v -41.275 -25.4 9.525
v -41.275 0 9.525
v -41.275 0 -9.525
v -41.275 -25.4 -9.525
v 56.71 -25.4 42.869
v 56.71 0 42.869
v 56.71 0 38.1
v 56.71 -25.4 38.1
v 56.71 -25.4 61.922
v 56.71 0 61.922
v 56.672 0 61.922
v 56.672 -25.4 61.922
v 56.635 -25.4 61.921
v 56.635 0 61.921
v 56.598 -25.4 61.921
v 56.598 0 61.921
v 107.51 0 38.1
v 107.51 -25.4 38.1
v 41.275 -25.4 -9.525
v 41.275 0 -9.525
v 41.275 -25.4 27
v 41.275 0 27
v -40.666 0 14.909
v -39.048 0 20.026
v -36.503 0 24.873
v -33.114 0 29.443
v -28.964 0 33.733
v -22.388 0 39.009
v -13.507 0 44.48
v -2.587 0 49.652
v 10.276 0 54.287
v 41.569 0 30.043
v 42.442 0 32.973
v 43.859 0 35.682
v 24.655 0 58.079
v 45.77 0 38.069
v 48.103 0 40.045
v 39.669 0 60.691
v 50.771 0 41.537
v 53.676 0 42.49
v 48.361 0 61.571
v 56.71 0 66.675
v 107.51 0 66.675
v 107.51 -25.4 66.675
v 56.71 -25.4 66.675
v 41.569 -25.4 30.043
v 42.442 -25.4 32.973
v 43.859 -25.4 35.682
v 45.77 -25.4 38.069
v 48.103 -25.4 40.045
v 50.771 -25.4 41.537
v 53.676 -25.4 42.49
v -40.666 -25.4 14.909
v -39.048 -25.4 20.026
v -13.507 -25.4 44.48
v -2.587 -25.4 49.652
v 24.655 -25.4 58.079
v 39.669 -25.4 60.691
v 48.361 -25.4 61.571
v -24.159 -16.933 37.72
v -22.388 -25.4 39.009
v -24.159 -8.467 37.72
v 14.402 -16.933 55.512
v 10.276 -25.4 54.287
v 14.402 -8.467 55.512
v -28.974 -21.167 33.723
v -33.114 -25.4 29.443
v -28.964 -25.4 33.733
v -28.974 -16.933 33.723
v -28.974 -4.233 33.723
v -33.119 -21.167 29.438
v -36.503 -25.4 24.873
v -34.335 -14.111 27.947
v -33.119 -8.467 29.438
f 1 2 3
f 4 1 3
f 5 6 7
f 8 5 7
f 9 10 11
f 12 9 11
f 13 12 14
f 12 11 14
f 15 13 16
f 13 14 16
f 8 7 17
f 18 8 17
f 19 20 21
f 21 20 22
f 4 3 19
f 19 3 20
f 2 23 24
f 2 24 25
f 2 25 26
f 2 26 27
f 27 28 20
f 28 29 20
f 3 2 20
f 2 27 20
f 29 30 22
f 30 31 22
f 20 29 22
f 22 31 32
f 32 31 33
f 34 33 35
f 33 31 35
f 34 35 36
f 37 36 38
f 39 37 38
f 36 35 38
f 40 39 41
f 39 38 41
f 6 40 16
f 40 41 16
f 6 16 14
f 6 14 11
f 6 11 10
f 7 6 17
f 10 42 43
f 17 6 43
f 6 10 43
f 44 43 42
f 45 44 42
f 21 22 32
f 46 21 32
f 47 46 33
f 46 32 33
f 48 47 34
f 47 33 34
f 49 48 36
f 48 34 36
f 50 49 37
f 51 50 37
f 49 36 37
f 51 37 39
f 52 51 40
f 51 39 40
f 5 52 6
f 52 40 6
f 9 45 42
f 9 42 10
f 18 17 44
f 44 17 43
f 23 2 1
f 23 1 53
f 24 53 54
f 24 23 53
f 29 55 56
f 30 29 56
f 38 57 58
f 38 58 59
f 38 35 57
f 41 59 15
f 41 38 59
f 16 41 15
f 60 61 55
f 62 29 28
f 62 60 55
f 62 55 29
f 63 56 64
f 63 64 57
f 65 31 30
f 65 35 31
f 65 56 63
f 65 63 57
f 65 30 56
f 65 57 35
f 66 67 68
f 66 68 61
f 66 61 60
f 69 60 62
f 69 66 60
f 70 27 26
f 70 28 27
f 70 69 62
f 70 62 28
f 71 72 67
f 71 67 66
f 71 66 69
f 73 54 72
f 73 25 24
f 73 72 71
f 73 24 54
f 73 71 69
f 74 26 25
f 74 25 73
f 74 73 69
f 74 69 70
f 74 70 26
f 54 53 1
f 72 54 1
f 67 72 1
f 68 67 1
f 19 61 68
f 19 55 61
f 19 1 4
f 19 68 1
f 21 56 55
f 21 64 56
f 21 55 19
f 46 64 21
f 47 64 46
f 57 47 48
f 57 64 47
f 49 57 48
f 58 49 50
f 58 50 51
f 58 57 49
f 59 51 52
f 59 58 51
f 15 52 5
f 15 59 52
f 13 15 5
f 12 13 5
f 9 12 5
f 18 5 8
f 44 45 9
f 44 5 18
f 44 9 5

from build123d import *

# Parameters (mm, degrees)
F0_W     = 25.4
F0_H     = 28.575
F1_DEPTH = 25.4


with BuildPart() as f1:
    # F0 (on Front) → F1 (new body)
    with BuildSketch(Plane.XZ):
        Polygon((41.275, -9.525), (41.275, 9.525), (22.225, 9.525), (-41.275, 9.525), (-41.275, -9.525), align=None)
        with BuildLine():
            Line((22.225, 9.525), (41.275, 9.525))
            Line((41.275, 9.525), (41.275, 27.0002))
            ThreePointArc((41.275, 27.0002), (45.7700842218, 38.0687654844), (56.7097265362, 42.869093606))
            Line((56.7097265362, 42.869093606), (56.7097265362, 61.9219276004))
            add(Edge.make_bspline(
                [(56.5976430534, 61.9208318214), (56.6350247317, 61.9212149579), (56.6723859179, 61.921580219), (56.7097265362, 61.9219276004)],
                knots=[110.9664964384, 110.9664964384, 110.9664964384, 110.9664964384, 111.075437095, 111.075437095, 111.075437095, 111.075437095], degree=3))
            ThreePointArc((56.5976430534, 61.9208318214), (32.2597740934, 51.4998383508), (22.225, 27.0002))
            Line((22.225, 27.0002), (22.225, 9.525))
        make_face()
        with BuildLine():
            Line((-41.275, 9.525), (22.225, 9.525))
            Line((22.225, 9.525), (22.225, 27.0002))
            ThreePointArc((22.225, 27.0002), (32.2597740934, 51.4998383508), (56.5976430534, 61.9208318214))
            add(Edge.make_bspline(
                [(-41.275, 9.525), (-40.8172895576, 42.5938186475), (18.5208221845, 61.5305705249), (56.5976430534, 61.9208318214)],
                knots=[0, 0, 0, 0, 110.9664964384, 110.9664964384, 110.9664964384, 110.9664964384], degree=3))
        make_face()
        with BuildLine():
            Line((56.7097265362, 61.9219276004), (56.7097265362, 42.869093606))
            Line((56.7097265362, 42.869093606), (56.7097265362, 38.1))
            Line((56.7097265362, 38.1), (82.1097265362, 38.1))
            Line((82.1097265362, 38.1), (82.1097265362, 66.675))
            Line((82.1097265362, 66.675), (56.7097265362, 66.675))
            Line((56.7097265362, 66.675), (56.7097265362, 61.9224247899))
            ThreePointArc((56.7097265362, 61.9224247899), (56.9298588949, 61.9245061906), (57.15, 61.9252))
            add(Edge.make_bspline(
                [(56.7097265362, 61.9219276004), (56.856805001, 61.9232958778), (57.0035643669, 61.9243867627), (57.15, 61.9252)],
                knots=[111.075437095, 111.075437095, 111.075437095, 111.075437095, 111.5045361635, 111.5045361635, 111.5045361635, 111.5045361635], degree=3))
        make_face()
        with BuildLine():
            ThreePointArc((56.7097265362, 61.9224247899), (56.6536841557, 61.9216732734), (56.5976430534, 61.9208318214))
            add(Edge.make_bspline(
                [(56.5976430534, 61.9208318214), (56.6350247317, 61.9212149579), (56.6723859179, 61.921580219), (56.7097265362, 61.9219276004)],
                knots=[110.9664964384, 110.9664964384, 110.9664964384, 110.9664964384, 111.075437095, 111.075437095, 111.075437095, 111.075437095], degree=3))
            Line((56.7097265362, 61.9219276004), (56.7097265362, 61.9224247899))
        make_face()
        with BuildLine():
            Line((56.7097265362, 61.9224247899), (56.7097265362, 61.9219276004))
            add(Edge.make_bspline(
                [(56.7097265362, 61.9219276004), (56.856805001, 61.9232958778), (57.0035643669, 61.9243867627), (57.15, 61.9252)],
                knots=[111.075437095, 111.075437095, 111.075437095, 111.075437095, 111.5045361635, 111.5045361635, 111.5045361635, 111.5045361635], degree=3))
            ThreePointArc((57.15, 61.9252), (56.9298588949, 61.9245061906), (56.7097265362, 61.9224247899))
        make_face()
        with Locations((94.8097265362, 52.3875)):
            Rectangle(F0_W, F0_H)
    extrude(amount=F1_DEPTH)


solid = f1.part
